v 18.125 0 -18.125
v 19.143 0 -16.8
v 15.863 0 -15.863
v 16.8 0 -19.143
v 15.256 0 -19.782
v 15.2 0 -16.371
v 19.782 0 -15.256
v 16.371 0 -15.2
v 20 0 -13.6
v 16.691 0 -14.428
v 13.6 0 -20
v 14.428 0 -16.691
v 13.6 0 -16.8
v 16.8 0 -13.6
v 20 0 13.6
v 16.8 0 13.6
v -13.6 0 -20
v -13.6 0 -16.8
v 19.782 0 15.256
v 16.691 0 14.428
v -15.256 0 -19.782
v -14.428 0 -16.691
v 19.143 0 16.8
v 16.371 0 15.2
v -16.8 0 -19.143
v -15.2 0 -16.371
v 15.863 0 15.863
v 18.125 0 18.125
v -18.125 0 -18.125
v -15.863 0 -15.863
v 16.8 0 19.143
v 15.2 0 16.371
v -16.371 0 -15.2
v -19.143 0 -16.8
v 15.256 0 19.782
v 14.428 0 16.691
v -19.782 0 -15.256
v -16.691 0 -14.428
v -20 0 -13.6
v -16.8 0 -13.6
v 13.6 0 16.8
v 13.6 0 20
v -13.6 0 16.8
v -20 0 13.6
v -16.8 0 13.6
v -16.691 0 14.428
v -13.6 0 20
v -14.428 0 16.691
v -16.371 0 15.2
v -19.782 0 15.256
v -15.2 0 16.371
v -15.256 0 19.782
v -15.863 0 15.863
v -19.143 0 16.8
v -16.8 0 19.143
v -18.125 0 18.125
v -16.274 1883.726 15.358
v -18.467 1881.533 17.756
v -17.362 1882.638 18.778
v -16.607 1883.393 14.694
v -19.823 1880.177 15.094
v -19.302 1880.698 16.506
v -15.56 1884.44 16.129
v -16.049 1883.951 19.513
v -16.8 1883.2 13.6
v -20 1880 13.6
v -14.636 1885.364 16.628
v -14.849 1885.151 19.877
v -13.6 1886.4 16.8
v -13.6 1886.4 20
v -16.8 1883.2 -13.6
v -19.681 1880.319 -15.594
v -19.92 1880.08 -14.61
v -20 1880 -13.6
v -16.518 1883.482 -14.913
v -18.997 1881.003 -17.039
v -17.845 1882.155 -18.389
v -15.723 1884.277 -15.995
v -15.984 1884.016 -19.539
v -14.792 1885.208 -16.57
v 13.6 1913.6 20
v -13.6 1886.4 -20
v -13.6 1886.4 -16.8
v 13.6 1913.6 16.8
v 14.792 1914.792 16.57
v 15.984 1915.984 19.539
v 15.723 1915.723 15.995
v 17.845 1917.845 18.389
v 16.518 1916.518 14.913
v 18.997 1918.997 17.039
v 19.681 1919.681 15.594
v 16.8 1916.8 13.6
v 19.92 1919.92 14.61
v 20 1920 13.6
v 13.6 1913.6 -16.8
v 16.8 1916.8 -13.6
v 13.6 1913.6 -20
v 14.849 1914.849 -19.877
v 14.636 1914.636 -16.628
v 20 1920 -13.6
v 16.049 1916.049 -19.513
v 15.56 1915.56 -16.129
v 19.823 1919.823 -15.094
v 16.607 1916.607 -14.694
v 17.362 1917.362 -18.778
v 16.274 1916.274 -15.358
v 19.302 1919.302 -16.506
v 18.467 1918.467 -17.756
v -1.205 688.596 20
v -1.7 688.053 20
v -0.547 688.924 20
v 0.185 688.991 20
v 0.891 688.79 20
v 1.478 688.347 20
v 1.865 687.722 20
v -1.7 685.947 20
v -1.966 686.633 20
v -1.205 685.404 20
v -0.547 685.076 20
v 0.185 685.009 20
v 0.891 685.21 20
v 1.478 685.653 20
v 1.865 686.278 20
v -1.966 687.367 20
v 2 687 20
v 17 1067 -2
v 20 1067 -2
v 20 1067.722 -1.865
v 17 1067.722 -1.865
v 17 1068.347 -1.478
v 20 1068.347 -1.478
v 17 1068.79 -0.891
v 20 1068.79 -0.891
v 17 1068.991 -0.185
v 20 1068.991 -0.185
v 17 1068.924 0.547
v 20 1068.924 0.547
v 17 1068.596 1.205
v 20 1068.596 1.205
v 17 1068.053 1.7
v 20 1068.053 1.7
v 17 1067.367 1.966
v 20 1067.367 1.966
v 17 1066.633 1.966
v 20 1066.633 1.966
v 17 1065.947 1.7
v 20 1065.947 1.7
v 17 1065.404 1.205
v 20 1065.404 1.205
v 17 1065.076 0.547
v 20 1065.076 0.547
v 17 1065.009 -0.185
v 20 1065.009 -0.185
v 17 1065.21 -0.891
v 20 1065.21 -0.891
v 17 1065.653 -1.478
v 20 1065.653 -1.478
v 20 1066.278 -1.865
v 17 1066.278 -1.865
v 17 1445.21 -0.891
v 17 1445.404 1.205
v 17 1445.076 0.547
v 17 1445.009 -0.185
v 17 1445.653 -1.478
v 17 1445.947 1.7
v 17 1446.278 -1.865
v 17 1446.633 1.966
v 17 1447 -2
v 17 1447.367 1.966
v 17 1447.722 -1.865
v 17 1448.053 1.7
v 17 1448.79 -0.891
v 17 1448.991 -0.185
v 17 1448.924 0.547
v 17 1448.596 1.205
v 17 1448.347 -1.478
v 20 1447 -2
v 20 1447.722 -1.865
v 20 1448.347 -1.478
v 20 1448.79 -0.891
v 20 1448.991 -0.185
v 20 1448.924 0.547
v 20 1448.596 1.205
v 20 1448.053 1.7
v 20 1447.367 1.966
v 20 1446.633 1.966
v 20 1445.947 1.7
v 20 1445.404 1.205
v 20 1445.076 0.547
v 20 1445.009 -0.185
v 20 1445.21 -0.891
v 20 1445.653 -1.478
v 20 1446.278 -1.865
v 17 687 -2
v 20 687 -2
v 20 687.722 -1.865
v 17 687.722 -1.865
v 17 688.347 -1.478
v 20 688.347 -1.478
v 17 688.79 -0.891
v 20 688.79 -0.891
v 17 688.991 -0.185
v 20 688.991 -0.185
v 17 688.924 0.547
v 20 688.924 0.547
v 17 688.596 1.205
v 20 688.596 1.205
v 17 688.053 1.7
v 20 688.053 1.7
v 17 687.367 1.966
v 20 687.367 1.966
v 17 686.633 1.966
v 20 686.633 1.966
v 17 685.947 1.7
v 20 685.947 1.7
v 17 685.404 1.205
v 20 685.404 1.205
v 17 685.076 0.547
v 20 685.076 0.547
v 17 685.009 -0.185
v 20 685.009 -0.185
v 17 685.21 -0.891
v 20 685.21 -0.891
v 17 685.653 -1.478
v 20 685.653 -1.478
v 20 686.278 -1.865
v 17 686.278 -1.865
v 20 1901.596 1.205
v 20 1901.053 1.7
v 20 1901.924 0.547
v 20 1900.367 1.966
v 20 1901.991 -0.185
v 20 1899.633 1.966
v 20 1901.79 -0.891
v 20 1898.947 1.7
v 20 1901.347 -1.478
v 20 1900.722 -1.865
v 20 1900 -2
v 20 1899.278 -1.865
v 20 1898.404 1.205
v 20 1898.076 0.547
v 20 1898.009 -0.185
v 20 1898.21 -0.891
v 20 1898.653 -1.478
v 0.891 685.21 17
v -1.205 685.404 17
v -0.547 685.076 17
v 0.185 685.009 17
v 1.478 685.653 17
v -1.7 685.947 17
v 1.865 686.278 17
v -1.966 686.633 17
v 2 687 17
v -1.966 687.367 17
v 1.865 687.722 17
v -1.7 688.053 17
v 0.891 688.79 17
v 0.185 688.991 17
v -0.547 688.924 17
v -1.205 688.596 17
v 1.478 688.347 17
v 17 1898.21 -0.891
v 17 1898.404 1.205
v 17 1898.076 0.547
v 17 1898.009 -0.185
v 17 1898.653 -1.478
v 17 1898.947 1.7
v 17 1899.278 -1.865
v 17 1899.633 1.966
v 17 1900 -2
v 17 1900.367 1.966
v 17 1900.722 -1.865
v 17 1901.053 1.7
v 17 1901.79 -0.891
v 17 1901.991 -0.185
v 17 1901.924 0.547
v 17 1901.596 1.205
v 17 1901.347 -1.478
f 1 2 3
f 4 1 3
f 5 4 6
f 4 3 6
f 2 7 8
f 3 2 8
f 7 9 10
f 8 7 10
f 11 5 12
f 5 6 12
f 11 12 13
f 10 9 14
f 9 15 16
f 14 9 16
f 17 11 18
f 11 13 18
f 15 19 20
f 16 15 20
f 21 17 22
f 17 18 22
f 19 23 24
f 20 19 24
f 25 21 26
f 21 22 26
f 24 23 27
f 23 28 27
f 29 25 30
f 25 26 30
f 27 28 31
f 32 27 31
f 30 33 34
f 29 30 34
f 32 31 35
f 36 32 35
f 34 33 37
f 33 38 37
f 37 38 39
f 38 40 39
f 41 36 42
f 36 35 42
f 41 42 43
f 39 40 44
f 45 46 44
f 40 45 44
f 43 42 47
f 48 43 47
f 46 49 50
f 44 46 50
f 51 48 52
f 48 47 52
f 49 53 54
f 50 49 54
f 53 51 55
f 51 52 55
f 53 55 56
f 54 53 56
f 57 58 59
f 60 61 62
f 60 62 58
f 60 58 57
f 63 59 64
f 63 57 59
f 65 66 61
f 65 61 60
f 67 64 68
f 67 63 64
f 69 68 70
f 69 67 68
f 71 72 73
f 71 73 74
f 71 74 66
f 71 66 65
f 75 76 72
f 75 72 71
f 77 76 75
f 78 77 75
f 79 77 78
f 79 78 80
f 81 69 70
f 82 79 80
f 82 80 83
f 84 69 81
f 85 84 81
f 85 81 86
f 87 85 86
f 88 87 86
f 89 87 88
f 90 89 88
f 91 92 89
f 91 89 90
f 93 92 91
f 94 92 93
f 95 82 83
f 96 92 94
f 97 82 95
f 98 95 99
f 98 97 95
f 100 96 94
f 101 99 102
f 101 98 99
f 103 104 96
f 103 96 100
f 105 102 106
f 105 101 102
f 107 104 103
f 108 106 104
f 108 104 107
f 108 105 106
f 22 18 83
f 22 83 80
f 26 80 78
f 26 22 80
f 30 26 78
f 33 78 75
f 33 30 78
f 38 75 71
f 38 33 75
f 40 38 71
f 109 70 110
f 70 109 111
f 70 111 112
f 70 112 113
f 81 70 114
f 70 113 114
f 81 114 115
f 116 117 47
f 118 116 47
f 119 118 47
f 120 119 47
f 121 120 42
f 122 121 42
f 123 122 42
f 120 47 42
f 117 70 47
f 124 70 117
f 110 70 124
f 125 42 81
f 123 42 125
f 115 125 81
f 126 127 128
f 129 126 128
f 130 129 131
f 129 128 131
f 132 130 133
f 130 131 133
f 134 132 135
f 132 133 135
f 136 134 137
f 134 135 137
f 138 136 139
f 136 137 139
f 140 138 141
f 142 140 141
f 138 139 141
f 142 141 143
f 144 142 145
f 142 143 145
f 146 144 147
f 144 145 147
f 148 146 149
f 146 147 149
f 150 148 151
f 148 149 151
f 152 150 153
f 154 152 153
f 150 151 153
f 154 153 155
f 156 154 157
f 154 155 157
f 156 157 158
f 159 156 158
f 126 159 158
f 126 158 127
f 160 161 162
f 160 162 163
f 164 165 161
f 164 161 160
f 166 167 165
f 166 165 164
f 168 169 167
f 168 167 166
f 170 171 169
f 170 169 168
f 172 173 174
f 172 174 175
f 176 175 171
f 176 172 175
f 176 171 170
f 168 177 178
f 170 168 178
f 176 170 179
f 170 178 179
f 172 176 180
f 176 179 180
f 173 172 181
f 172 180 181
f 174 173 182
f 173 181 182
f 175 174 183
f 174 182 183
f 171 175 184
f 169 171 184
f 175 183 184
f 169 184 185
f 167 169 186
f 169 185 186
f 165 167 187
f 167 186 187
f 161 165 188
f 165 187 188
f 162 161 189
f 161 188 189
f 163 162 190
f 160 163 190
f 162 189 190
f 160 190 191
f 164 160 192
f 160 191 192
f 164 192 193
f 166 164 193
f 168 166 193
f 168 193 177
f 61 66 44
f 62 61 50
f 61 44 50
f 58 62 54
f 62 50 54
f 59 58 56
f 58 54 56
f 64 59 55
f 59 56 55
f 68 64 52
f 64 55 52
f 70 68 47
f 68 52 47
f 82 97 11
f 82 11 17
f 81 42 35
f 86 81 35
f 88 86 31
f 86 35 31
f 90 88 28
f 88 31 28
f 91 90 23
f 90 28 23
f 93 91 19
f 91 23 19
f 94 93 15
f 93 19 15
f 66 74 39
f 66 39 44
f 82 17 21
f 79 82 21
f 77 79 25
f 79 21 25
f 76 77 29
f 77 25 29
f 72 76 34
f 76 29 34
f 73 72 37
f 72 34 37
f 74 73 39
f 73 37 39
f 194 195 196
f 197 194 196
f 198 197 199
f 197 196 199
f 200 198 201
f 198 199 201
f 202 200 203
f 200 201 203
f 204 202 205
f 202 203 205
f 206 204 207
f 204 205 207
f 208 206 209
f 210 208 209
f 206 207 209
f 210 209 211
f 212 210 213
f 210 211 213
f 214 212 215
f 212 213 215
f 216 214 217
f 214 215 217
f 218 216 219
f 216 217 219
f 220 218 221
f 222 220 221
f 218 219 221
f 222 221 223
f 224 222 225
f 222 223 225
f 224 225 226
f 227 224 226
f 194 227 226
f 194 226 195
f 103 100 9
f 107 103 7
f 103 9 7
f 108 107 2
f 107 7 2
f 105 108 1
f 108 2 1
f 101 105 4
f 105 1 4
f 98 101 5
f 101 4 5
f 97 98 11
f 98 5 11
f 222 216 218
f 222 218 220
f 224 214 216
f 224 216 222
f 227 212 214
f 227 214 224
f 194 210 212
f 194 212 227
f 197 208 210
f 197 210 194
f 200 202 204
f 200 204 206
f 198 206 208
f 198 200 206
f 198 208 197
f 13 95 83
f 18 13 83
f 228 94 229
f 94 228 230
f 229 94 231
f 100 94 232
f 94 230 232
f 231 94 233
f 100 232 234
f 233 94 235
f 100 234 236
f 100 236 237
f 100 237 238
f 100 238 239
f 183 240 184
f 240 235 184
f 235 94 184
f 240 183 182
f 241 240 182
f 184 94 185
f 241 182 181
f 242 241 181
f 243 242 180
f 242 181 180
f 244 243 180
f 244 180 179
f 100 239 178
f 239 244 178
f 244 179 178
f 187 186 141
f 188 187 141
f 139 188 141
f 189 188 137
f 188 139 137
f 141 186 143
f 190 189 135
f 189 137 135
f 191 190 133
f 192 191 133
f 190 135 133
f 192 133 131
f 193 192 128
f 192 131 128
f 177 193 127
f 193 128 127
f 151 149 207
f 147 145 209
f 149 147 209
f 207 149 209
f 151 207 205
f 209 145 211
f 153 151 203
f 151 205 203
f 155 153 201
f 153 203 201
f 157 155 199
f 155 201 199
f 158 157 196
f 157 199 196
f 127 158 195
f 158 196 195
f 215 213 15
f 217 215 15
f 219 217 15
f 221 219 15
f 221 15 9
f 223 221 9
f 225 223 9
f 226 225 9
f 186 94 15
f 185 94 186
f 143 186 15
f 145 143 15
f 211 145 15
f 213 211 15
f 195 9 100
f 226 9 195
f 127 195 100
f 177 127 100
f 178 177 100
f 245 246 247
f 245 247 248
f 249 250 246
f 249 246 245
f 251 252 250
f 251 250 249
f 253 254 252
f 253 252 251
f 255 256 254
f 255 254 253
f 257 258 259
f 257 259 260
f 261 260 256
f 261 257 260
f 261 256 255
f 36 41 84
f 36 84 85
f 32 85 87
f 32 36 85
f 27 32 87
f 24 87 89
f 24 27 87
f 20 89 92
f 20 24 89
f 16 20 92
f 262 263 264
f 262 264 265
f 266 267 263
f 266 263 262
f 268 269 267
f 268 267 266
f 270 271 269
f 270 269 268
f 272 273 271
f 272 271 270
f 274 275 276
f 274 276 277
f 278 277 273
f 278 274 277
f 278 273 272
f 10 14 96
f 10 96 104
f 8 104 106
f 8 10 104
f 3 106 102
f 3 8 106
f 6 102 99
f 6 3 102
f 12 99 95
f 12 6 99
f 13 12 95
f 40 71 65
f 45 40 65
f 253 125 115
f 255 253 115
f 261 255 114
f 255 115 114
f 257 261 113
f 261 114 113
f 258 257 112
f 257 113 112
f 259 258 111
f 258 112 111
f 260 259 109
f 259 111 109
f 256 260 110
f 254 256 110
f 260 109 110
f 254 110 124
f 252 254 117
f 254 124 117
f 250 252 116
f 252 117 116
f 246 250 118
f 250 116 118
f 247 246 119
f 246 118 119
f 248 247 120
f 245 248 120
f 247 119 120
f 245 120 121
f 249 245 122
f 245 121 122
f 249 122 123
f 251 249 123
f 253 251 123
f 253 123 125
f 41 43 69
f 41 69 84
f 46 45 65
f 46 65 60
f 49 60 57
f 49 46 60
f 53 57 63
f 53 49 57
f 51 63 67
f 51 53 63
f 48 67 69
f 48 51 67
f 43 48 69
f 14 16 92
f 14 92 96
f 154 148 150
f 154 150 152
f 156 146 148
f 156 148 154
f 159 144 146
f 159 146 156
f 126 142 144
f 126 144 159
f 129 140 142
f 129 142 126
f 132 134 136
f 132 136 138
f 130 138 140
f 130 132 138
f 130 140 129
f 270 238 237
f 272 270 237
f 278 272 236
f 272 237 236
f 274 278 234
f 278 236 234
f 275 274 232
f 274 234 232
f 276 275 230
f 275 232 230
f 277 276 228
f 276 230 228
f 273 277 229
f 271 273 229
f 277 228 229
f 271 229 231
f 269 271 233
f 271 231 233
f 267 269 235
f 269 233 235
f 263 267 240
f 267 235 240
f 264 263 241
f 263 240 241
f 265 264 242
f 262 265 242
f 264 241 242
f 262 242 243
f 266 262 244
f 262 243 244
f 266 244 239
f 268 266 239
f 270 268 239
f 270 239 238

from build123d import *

# Parameters (mm, degrees)
TUBE_SQUARE_40_X_40_X_3_2_1_DEPTH = 1920
CUT_EXTRUDE1_DEPTH                = 1921.52076271
SKETCH16_R                        = 2
CUT_EXTRUDE2_DEPTH                = 3
SKETCH17_R                        = 2
CUT_EXTRUDE3_DEPTH                = 3


with BuildPart() as part:
    # Sketch15 → Tube (square) 40 X 40 X 3.2(1) (new body)
    with BuildSketch(Plane(origin=(0, 0, 0), x_dir=(-1, 0, 0), z_dir=(0, 1, 0))):
        with BuildLine():
            Line((-13.6, -20), (13.6, -20))
            ThreePointArc((13.6, -20), (18.1254834, -18.1254834), (20, -13.6))
            Line((20, -13.6), (20, 13.6))
            ThreePointArc((20, 13.6), (18.1254834, 18.1254834), (13.6, 20))
            Line((13.6, 20), (-13.6, 20))
            ThreePointArc((-13.6, 20), (-18.1254834, 18.1254834), (-20, 13.6))
            Line((-20, 13.6), (-20, -13.6))
            ThreePointArc((-20, -13.6), (-18.1254834, -18.1254834), (-13.6, -20))
        make_face()
        with BuildLine():
            Line((-13.6, -16.8), (13.6, -16.8))
            ThreePointArc((13.6, -16.8), (15.8627417, -15.8627417), (16.8, -13.6))
            Line((16.8, -13.6), (16.8, 13.6))
            ThreePointArc((16.8, 13.6), (15.8627417, 15.8627417), (13.6, 16.8))
            Line((13.6, 16.8), (-13.6, 16.8))
            ThreePointArc((-13.6, 16.8), (-15.8627417, 15.8627417), (-16.8, 13.6))
            Line((-16.8, 13.6), (-16.8, -13.6))
            ThreePointArc((-16.8, -13.6), (-15.8627417, -15.8627417), (-13.6, -16.8))
        make_face(mode=Mode.SUBTRACT)
    extrude(amount=TUBE_SQUARE_40_X_40_X_3_2_1_DEPTH)

    # Sketch13 → Cut-Extrude1 (cut, through all)
    with BuildSketch(Plane(origin=(0, 0, -20), x_dir=(-1, 0, 0), z_dir=(0, 0, -1))):
        Polygon((20, 1880), (-20, 1920), (20, 1920), align=None)
    extrude(amount=-CUT_EXTRUDE1_DEPTH, mode=Mode.SUBTRACT)

    # Sketch16 → Cut-Extrude2 (cut)
    with BuildSketch(Plane(origin=(20, 0, 0), x_dir=(0, 0, -1), z_dir=(1, 0, 0))):
        with Locations((0, 1900)):
            Circle(SKETCH16_R)
        with Locations((0, 1447)):
            Circle(SKETCH16_R)
        with Locations((0, 1067)):
            Circle(SKETCH16_R)
        with Locations((0, 687)):
            Circle(SKETCH16_R)
    extrude(amount=-CUT_EXTRUDE2_DEPTH, mode=Mode.SUBTRACT)

    # Sketch17 → Cut-Extrude3 (cut)
    with BuildSketch(Plane.XY.offset(20)):
        with Locations((0, 687)):
            Circle(SKETCH17_R)
    extrude(amount=-CUT_EXTRUDE3_DEPTH, mode=Mode.SUBTRACT)


solid = part.part
